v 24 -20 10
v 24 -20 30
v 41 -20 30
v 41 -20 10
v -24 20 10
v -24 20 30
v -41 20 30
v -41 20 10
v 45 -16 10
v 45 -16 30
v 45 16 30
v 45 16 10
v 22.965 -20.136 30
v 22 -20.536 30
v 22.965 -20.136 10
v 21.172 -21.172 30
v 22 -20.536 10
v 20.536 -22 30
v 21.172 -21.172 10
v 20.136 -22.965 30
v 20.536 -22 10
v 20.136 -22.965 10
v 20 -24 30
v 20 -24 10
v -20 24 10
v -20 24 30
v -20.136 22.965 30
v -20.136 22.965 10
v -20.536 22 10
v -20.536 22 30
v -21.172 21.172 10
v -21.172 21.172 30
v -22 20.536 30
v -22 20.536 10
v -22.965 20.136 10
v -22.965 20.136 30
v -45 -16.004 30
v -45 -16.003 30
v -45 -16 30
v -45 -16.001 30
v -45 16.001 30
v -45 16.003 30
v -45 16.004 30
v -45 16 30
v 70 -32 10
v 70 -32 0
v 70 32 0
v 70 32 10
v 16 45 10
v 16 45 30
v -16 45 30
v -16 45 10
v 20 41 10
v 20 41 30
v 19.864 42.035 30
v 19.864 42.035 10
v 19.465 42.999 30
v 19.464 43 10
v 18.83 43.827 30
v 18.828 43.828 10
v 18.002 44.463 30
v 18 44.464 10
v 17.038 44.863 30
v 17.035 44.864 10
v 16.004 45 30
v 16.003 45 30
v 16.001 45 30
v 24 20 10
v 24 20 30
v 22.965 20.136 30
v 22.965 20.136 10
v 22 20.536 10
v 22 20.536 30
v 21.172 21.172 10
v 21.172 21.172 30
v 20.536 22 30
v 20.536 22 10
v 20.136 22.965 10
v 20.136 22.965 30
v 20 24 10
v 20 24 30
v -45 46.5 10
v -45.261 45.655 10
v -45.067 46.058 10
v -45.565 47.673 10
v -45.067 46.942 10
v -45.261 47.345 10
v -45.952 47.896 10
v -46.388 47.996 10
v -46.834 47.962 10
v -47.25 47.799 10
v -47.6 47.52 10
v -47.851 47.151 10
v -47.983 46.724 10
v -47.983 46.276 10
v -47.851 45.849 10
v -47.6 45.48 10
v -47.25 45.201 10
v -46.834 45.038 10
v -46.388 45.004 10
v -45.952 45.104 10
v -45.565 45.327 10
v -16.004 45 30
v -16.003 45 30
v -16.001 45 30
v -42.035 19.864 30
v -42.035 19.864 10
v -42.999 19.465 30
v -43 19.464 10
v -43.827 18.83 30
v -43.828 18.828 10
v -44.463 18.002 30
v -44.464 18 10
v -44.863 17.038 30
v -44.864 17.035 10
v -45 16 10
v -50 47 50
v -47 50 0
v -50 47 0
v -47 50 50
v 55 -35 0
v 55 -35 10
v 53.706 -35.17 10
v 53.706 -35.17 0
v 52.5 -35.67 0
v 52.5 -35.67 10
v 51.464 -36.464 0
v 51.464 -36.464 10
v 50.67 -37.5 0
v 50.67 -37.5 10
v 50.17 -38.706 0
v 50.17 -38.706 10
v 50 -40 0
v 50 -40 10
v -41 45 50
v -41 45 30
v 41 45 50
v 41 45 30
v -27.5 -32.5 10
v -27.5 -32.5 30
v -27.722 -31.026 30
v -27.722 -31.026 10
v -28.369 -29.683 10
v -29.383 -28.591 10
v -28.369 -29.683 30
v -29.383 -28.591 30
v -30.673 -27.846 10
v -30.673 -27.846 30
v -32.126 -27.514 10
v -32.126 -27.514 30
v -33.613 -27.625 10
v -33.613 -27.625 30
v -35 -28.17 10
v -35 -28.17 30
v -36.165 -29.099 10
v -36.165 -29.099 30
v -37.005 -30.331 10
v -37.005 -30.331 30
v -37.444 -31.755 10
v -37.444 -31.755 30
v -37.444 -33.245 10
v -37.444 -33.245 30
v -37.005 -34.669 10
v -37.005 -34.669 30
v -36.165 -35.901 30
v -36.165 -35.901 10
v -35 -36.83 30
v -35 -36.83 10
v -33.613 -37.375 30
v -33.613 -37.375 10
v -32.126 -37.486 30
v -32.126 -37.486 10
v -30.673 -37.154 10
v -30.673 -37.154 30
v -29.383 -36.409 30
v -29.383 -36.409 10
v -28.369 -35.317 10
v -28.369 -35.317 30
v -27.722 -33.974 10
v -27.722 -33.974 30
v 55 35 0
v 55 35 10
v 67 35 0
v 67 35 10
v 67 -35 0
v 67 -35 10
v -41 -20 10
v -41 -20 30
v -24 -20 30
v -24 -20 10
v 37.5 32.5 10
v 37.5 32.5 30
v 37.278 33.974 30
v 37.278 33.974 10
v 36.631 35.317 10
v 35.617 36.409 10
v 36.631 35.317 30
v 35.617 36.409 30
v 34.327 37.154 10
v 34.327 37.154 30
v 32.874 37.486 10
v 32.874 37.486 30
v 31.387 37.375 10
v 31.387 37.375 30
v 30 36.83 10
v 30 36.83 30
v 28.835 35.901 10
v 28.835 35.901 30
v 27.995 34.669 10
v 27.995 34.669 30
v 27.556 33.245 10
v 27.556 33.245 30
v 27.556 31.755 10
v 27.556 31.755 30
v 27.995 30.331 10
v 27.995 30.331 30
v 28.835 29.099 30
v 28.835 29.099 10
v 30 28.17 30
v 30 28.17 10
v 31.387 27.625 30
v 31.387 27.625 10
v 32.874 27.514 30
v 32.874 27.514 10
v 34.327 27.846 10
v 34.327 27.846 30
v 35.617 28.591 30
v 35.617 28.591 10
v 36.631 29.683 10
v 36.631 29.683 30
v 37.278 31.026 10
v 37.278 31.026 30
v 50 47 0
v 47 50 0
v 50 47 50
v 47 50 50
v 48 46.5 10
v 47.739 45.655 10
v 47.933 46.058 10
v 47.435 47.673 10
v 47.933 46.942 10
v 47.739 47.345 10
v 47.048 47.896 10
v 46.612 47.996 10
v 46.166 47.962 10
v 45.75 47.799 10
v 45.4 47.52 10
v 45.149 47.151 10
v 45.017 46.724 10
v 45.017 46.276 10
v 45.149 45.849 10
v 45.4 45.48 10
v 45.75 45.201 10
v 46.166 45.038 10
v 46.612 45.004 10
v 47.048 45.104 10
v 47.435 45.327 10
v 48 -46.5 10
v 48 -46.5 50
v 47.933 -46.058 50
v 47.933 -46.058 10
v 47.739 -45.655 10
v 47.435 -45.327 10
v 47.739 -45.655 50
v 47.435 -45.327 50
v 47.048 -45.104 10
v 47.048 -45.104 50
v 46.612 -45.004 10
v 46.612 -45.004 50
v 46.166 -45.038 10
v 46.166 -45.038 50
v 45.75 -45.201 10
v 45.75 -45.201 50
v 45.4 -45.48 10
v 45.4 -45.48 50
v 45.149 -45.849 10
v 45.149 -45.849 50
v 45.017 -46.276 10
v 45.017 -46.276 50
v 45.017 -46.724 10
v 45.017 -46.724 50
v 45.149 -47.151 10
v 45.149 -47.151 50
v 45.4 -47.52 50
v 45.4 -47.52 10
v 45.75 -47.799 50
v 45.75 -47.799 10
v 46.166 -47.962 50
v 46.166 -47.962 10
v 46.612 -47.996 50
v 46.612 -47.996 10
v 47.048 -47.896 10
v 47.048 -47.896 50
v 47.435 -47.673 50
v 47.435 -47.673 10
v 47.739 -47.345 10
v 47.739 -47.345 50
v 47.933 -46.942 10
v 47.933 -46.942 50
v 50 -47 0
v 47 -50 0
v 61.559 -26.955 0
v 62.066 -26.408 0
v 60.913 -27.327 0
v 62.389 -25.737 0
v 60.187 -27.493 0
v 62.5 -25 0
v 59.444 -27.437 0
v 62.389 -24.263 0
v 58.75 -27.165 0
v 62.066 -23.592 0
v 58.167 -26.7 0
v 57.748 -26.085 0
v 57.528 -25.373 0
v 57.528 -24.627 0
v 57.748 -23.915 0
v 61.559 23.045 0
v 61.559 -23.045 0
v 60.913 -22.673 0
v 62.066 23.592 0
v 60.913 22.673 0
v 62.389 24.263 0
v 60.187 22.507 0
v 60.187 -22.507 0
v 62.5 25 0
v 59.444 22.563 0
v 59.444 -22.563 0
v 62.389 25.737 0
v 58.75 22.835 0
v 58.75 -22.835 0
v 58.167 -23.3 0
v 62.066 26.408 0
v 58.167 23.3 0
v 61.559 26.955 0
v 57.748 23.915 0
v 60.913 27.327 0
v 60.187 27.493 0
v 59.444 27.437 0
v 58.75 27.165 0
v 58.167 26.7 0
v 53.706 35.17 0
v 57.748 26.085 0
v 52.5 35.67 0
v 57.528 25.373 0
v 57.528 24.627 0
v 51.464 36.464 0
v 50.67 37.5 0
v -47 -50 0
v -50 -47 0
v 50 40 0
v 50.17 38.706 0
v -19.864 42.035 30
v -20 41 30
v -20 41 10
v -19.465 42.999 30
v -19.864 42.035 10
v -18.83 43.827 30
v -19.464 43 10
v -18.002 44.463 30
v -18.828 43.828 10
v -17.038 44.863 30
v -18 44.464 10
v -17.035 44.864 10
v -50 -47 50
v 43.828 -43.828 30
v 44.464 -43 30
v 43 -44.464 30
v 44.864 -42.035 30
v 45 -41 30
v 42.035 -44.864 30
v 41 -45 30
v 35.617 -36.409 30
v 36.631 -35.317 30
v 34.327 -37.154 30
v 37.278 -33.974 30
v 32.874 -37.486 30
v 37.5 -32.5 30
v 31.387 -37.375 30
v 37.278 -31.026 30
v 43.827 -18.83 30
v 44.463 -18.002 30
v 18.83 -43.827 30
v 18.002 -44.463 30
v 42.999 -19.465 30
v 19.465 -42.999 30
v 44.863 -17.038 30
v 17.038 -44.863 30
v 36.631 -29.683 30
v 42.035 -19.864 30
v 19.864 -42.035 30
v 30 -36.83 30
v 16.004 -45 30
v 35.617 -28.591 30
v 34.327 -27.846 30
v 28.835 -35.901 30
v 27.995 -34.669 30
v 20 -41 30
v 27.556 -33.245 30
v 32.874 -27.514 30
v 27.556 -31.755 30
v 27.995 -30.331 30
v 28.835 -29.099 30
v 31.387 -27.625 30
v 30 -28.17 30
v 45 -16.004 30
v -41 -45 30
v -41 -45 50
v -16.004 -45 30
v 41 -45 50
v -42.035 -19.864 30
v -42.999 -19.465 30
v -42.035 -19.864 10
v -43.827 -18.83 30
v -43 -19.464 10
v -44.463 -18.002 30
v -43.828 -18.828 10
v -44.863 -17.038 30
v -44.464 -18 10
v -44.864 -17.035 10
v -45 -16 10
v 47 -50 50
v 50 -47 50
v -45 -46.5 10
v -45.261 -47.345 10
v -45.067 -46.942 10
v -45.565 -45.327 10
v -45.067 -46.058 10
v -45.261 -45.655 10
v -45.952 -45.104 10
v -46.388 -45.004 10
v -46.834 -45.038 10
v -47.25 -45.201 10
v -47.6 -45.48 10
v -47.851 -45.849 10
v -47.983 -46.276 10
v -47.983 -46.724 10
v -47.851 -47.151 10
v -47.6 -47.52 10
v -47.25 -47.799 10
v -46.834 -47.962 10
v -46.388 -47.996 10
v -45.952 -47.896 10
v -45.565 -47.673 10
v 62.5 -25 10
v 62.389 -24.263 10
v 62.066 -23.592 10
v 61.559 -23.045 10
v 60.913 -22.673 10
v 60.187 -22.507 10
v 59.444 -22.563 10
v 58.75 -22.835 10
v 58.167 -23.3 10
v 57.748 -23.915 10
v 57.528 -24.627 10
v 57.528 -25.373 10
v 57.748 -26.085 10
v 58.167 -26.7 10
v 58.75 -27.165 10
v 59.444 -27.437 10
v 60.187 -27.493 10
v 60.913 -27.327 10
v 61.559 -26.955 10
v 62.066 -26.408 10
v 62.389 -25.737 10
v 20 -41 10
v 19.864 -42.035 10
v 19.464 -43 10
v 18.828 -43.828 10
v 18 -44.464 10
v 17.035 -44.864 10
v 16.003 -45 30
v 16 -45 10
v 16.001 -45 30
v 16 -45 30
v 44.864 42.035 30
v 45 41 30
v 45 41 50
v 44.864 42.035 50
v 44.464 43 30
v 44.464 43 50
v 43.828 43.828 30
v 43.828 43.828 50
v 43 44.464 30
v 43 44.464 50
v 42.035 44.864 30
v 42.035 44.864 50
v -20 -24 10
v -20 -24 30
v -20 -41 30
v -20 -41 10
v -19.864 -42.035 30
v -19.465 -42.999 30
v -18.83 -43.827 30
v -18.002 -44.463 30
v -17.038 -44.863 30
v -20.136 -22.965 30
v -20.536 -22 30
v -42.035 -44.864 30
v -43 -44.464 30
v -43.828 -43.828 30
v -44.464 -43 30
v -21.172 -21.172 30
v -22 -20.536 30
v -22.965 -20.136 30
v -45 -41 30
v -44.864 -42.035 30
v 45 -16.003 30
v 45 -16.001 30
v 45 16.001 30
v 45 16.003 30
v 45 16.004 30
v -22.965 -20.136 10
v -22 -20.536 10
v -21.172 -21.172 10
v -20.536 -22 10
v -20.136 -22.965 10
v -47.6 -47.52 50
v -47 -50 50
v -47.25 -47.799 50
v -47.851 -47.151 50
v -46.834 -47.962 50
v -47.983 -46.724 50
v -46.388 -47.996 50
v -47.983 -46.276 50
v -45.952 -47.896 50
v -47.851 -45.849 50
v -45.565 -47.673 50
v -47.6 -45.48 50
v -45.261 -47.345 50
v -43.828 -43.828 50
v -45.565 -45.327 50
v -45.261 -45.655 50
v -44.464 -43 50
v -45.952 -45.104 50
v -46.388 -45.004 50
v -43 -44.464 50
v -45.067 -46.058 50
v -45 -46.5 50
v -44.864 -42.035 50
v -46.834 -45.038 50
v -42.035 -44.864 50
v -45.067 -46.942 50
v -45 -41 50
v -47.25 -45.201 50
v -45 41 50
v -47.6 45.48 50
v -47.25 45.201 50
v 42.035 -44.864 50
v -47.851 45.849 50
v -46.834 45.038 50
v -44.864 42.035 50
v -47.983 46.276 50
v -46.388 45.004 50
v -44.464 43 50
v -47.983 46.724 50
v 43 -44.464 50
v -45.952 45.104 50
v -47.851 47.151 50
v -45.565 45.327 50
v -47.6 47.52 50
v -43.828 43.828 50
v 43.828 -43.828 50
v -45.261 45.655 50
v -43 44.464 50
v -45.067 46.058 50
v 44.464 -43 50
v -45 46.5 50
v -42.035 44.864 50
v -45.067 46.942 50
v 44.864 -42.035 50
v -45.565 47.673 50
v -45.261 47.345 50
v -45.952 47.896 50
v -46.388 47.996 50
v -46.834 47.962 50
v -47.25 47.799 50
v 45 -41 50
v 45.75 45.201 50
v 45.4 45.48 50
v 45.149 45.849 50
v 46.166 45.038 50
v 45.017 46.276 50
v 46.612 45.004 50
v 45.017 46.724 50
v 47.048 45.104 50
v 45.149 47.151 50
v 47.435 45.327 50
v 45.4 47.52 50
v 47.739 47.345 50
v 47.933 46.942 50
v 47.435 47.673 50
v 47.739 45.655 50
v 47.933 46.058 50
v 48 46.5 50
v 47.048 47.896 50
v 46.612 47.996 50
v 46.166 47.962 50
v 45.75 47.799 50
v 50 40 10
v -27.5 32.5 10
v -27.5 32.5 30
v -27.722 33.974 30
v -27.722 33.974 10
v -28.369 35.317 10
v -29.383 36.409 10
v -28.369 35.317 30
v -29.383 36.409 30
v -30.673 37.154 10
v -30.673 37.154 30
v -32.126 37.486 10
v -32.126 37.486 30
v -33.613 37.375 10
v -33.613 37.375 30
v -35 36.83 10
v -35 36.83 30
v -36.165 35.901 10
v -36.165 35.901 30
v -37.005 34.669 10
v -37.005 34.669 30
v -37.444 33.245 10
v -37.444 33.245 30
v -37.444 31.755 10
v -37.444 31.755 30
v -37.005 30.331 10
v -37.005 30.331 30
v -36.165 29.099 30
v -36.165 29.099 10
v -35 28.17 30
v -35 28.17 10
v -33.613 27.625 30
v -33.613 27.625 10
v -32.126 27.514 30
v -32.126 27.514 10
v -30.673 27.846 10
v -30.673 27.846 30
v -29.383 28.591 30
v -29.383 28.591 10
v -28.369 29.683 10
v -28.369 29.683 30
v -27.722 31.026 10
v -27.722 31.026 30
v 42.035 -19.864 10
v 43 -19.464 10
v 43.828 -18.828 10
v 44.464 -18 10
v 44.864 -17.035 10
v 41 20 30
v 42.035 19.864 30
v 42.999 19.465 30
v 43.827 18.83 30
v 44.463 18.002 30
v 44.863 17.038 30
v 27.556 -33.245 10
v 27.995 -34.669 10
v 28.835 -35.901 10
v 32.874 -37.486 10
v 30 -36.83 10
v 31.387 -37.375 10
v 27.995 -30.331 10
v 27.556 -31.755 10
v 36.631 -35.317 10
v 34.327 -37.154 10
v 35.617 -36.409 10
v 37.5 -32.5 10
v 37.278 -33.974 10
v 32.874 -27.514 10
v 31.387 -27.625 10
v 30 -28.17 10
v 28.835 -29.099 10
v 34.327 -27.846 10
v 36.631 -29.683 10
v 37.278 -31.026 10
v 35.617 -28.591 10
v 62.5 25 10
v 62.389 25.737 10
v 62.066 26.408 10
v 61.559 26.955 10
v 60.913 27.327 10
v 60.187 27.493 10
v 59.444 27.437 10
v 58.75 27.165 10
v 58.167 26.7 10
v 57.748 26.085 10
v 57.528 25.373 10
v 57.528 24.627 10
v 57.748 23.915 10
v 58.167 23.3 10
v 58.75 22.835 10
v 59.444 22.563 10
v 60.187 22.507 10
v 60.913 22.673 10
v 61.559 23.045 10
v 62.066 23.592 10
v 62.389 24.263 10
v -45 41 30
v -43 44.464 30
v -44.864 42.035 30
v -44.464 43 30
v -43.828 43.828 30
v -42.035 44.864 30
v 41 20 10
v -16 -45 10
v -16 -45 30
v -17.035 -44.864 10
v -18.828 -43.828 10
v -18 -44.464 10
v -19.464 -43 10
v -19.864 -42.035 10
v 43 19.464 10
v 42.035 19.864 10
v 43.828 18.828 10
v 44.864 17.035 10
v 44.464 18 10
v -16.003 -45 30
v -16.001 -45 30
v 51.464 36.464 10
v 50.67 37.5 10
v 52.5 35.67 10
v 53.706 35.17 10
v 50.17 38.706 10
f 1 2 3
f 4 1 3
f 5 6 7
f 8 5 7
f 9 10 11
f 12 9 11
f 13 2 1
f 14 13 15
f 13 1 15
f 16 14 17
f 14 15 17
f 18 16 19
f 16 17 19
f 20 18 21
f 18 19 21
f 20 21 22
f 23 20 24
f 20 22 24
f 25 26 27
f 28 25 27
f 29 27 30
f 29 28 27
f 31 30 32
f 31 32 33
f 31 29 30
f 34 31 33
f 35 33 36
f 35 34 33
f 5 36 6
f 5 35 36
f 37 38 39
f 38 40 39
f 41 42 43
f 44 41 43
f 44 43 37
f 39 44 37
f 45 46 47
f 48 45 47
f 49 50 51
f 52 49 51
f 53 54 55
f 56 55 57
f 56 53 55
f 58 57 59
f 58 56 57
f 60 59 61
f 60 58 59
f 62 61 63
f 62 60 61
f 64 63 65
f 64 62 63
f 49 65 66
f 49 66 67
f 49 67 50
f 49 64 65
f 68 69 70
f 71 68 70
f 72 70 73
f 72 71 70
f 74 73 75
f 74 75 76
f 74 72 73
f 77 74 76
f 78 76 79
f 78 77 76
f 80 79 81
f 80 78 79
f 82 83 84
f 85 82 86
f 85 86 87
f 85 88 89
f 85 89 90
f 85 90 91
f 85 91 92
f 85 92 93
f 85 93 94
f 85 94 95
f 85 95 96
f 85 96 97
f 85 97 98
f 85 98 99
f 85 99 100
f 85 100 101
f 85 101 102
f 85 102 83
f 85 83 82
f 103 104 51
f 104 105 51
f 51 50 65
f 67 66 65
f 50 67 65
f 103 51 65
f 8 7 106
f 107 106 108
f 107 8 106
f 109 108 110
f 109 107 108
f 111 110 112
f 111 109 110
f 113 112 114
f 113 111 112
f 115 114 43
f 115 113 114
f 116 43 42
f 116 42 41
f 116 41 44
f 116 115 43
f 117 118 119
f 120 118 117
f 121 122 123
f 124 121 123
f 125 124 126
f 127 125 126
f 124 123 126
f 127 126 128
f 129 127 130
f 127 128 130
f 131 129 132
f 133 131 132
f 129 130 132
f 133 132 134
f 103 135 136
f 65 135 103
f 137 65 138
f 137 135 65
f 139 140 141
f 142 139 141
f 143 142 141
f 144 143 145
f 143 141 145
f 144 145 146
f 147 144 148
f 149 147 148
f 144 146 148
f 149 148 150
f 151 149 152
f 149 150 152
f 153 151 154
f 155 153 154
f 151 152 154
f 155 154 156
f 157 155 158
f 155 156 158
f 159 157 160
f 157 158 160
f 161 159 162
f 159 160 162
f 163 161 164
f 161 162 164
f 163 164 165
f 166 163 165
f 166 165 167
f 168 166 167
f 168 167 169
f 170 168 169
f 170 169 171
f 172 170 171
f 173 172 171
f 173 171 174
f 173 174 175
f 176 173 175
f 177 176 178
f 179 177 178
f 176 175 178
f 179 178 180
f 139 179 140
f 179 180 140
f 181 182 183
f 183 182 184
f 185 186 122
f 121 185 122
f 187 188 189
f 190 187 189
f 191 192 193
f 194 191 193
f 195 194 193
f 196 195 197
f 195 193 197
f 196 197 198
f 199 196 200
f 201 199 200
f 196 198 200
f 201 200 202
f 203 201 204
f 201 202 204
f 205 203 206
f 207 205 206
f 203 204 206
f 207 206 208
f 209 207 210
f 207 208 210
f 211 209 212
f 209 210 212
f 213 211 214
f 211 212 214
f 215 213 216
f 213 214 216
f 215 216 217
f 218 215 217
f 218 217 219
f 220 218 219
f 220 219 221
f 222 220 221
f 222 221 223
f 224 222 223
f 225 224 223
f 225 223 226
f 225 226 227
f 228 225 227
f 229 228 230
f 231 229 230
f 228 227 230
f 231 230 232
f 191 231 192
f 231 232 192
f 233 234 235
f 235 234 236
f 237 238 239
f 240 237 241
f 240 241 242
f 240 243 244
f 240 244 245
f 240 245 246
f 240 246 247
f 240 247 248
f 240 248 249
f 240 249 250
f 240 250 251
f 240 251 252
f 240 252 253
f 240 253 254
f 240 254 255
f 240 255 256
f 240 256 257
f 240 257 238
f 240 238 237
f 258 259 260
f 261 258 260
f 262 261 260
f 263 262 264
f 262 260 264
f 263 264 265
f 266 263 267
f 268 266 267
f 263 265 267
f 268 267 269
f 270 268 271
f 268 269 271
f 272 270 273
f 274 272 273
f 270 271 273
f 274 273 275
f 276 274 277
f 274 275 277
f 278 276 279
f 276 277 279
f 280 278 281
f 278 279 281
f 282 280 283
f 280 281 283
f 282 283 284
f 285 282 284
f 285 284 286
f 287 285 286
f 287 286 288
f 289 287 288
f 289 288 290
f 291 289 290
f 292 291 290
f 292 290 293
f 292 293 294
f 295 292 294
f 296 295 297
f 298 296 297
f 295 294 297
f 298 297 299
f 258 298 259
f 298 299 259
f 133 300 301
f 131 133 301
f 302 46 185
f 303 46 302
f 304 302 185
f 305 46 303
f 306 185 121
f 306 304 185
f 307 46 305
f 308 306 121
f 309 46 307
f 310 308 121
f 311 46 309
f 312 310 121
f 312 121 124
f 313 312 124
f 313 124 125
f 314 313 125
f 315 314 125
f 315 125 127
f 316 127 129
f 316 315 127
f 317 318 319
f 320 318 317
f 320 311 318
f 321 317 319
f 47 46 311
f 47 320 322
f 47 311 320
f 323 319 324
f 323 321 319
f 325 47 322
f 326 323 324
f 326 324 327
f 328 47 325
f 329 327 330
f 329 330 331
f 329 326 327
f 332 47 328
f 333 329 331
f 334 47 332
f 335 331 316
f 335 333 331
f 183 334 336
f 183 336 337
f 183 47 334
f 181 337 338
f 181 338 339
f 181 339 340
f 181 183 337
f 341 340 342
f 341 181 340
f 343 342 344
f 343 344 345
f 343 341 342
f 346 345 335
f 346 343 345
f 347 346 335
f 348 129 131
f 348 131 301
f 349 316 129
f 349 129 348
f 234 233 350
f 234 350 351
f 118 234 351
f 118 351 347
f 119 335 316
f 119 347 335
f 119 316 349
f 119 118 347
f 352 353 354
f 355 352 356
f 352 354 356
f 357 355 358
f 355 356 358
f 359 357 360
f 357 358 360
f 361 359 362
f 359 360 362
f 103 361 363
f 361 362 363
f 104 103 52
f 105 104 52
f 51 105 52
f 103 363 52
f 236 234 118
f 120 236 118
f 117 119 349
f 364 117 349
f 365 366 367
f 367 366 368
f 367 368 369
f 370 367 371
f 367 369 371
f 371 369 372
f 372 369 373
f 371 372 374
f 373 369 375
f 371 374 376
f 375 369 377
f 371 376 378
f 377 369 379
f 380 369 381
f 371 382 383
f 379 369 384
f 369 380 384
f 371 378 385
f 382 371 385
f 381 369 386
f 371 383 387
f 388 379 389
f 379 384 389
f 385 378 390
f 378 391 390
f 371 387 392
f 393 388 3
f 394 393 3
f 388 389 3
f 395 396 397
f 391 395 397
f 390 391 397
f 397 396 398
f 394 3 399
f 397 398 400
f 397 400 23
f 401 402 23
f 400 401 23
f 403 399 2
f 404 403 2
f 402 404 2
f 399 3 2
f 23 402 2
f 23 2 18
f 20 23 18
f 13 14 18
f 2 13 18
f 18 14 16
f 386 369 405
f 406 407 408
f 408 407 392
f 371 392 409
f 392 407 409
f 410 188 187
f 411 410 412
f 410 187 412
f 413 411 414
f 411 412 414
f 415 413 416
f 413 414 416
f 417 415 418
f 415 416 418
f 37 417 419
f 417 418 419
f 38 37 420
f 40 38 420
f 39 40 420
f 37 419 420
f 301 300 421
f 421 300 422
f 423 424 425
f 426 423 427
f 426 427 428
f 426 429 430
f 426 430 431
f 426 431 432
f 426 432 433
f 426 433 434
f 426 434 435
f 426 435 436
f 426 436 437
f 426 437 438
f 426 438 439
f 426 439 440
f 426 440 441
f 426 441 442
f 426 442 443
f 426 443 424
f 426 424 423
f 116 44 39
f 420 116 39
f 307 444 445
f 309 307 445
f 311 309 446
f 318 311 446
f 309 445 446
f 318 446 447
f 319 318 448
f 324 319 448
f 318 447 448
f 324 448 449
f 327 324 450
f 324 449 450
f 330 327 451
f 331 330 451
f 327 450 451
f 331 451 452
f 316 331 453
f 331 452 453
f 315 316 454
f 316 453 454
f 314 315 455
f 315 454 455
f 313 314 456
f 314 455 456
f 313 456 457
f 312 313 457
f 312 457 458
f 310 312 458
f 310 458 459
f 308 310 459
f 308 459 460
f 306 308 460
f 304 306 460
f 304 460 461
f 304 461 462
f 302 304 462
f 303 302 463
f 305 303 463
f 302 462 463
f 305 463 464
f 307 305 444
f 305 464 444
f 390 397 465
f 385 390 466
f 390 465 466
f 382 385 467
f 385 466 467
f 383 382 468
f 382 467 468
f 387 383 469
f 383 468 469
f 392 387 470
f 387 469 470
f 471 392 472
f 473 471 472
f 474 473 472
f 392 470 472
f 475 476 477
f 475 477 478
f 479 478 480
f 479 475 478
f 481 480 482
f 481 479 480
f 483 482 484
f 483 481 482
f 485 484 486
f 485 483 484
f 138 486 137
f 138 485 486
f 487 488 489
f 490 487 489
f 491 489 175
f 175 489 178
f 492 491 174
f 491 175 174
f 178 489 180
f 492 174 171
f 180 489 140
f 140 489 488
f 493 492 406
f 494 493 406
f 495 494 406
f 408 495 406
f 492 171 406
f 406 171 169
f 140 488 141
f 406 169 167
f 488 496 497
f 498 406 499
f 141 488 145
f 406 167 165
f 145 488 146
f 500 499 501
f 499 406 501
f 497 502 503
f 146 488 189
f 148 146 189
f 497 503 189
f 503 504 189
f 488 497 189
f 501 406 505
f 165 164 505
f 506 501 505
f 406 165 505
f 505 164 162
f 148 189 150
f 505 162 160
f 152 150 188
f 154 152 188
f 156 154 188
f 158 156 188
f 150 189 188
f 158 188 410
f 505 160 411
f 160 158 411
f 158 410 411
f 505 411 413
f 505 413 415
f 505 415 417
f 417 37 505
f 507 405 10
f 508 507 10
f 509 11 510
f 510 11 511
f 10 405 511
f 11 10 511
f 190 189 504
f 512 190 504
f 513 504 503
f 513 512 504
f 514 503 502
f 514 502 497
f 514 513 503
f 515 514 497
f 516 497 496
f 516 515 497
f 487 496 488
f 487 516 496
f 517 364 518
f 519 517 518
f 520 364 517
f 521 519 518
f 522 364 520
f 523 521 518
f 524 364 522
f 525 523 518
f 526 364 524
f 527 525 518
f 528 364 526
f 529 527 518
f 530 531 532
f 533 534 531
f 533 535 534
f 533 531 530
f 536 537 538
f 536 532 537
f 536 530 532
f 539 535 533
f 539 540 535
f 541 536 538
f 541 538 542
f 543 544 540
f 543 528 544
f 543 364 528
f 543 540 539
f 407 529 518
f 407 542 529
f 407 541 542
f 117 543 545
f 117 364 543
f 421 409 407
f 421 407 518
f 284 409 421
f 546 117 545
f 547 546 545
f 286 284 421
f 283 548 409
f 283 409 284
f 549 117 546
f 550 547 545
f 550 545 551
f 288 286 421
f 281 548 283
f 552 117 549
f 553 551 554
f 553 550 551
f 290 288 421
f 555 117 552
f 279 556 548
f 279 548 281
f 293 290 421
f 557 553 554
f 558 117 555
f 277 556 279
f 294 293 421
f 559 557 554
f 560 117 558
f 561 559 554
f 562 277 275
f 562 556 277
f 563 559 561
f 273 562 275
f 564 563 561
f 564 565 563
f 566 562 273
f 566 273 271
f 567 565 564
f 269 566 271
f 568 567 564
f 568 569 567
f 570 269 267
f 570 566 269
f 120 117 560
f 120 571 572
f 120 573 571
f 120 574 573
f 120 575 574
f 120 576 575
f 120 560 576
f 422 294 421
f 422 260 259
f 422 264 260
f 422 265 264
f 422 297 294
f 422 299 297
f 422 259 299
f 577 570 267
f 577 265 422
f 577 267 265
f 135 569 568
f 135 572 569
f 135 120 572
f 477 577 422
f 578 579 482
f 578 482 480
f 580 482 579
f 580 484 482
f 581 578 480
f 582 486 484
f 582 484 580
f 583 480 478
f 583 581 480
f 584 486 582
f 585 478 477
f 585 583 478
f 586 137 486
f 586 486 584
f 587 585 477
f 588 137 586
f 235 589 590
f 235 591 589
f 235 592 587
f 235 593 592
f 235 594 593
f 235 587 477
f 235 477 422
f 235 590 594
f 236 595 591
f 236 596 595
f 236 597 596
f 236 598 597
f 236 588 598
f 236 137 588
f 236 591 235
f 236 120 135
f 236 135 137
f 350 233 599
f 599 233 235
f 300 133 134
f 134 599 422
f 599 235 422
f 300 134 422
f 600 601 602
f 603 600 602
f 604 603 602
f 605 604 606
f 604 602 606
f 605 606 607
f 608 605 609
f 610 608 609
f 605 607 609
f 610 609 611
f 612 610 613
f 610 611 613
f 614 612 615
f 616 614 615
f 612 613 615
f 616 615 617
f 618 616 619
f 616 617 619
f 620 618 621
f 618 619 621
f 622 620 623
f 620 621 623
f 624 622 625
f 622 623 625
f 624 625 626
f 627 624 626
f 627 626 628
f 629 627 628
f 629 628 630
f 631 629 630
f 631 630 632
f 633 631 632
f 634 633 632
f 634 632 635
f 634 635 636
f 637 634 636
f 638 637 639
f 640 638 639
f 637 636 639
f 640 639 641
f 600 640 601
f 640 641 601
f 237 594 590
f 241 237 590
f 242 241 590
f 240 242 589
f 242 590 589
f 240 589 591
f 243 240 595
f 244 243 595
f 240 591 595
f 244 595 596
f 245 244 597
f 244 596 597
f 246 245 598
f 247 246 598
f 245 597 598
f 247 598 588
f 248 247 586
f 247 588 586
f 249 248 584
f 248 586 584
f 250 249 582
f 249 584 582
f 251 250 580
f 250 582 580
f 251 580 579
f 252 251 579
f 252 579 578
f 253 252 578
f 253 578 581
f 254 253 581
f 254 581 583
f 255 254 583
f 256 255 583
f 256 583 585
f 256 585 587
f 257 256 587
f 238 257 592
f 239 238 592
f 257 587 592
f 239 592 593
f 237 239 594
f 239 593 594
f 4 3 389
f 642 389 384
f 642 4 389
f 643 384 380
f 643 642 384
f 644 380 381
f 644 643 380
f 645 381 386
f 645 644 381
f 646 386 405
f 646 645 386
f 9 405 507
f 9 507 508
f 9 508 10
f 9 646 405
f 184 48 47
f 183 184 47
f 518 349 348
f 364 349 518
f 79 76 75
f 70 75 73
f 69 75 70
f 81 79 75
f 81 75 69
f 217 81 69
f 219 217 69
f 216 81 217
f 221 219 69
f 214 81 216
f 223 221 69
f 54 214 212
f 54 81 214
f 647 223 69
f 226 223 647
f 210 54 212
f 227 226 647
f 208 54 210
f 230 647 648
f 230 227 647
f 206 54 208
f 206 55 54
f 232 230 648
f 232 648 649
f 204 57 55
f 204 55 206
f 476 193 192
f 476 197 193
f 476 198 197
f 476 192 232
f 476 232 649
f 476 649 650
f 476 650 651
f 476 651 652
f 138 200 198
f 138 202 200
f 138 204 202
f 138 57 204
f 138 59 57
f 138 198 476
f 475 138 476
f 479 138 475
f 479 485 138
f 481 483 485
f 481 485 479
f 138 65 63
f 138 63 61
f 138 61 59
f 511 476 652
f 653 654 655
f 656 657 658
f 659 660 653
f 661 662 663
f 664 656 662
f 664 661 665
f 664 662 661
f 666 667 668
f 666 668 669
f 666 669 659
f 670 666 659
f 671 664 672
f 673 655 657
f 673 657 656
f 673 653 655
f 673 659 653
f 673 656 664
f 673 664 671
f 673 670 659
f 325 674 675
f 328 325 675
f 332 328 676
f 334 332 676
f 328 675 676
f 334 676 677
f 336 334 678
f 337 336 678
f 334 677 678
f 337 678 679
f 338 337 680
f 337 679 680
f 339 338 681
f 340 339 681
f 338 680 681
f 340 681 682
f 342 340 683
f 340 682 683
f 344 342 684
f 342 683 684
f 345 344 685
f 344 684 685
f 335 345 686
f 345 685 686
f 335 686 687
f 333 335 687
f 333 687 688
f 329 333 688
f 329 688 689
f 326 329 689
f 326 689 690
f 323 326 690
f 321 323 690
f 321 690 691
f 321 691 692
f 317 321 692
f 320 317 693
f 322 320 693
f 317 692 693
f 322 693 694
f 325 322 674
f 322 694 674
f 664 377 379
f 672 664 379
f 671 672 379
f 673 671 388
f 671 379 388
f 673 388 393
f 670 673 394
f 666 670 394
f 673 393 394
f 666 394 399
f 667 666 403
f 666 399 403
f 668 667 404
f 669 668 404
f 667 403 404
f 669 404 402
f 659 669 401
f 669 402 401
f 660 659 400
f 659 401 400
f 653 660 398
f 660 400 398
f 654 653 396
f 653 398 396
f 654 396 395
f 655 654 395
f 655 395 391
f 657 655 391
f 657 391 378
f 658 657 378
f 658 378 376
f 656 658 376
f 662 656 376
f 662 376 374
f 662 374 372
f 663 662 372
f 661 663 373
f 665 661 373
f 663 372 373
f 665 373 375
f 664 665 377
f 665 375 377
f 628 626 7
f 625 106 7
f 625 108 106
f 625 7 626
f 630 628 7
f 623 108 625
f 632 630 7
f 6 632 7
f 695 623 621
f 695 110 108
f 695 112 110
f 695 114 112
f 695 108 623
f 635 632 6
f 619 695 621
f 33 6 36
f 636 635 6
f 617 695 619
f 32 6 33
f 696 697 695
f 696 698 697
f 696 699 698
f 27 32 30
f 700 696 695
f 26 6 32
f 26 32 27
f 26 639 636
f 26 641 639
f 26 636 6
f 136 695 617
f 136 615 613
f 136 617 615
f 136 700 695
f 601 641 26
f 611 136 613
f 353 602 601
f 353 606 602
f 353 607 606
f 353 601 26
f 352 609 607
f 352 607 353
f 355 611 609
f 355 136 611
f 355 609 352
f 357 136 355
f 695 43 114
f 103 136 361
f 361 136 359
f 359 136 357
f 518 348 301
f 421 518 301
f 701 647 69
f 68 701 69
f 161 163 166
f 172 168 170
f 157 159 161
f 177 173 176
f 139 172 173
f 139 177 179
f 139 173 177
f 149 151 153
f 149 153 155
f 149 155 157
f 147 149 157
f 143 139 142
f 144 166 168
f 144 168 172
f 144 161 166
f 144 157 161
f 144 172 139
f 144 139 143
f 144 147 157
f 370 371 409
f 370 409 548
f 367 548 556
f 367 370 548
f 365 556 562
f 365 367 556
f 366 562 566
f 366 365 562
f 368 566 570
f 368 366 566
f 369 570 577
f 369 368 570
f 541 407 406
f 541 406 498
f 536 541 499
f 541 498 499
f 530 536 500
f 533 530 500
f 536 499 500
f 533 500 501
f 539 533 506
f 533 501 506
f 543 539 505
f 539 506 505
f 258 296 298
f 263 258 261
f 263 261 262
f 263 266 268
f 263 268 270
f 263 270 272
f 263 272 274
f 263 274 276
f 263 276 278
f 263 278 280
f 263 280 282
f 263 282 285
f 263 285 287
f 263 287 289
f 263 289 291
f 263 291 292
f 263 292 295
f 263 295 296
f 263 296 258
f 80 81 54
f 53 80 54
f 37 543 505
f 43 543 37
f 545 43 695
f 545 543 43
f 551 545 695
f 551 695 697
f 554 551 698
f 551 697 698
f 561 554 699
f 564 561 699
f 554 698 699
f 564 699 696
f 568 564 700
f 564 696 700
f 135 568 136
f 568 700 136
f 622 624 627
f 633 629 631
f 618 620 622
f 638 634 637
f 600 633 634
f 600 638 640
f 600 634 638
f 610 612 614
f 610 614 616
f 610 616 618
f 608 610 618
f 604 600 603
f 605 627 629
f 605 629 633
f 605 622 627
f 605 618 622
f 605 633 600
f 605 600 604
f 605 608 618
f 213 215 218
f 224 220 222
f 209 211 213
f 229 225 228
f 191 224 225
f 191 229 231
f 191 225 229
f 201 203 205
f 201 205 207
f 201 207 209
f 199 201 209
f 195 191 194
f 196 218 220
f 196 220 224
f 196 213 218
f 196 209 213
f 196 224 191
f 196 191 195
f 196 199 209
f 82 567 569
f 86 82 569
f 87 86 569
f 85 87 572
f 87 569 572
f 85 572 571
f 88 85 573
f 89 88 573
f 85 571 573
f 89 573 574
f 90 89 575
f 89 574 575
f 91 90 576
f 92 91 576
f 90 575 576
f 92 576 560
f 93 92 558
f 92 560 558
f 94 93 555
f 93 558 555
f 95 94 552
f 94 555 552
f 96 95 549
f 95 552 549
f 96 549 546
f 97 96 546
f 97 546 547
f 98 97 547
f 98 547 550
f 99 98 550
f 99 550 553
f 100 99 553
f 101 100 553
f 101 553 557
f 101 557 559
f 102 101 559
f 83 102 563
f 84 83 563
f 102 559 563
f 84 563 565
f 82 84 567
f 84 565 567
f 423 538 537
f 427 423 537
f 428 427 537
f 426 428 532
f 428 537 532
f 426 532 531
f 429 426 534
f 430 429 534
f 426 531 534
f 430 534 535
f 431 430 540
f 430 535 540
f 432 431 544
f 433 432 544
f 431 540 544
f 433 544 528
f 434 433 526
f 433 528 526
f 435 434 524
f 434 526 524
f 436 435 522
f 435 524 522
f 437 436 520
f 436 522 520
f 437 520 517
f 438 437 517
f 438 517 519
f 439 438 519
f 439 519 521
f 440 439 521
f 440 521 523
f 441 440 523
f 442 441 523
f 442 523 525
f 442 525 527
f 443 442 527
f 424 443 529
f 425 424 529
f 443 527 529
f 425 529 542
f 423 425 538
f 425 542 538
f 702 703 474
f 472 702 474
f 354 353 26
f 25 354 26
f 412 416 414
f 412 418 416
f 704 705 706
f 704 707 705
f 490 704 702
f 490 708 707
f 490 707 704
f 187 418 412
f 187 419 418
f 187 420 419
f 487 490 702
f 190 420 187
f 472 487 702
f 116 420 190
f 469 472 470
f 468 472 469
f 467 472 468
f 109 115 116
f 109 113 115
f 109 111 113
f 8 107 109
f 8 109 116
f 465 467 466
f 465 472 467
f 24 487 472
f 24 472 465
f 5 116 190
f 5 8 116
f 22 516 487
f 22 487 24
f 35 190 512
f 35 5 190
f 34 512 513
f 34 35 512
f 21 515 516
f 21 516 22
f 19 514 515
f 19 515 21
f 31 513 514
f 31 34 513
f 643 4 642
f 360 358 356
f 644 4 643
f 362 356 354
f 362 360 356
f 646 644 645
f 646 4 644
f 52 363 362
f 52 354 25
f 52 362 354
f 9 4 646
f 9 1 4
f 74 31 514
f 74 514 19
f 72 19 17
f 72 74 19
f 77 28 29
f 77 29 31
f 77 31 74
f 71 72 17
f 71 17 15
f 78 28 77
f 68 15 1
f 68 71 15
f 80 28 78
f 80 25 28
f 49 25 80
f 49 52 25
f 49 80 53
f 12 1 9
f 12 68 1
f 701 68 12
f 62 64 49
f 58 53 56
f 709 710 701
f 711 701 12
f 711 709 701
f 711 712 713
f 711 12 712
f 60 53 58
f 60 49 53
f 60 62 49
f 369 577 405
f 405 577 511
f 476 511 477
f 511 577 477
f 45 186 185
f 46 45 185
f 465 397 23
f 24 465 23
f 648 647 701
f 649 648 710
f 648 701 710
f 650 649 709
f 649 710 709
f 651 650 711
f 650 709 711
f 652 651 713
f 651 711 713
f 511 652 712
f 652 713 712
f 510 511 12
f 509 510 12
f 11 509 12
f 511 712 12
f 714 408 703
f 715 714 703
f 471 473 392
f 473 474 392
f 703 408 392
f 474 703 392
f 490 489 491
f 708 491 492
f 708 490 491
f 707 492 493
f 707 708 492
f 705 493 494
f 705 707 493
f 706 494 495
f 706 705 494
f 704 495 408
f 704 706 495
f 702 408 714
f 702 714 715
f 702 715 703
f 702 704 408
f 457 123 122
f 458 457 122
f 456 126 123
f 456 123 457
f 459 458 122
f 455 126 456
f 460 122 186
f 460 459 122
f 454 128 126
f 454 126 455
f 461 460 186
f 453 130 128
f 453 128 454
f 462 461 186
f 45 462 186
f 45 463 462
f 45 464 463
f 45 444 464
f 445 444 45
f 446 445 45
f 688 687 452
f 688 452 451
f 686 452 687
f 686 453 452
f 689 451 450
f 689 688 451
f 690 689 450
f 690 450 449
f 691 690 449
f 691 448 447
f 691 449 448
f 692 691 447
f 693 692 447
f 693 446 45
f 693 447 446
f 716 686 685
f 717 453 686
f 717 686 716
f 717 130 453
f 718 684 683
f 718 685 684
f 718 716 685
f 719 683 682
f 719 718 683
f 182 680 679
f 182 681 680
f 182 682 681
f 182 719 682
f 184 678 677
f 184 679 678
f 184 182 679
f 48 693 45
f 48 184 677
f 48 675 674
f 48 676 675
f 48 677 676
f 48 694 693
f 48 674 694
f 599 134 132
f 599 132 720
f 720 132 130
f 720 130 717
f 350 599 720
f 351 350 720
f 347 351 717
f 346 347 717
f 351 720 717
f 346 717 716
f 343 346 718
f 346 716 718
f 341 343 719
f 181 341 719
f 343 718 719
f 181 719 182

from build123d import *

# Parameters (mm, degrees)
F1_DEPTH     = 50
F2_W         = 20
F2_H         = 100
F3_DEPTH     = 40
F4_R         = 2.5
F5_DEPTH     = 10
F6_W         = 90
F6_H         = 90
F7_DEPTH     = 20
F8_R         = 5
F9_DEPTH     = 20
F10_R        = 1.5
F11_DEPTH    = 40
F12_SIZE     = 3
F13_T1_DEPTH = 30
F13_T3_DEPTH = 30
F13_T5_DEPTH = 30


# Not quite as in the source:
# - a fillet or chamfer that OpenCascade refuses, or shapes differently, is made with other operations: its cross-section is extruded or revolved along the edge and cut away or added


with BuildPart() as f1:
    # F0 (on Top) → F1 (new body)
    with BuildSketch(Plane.XY):
        Polygon((-50, -50), (50, -50), (70, -50), (70, 50), (50, 50), (-50, 50), align=None)
    extrude(amount=F1_DEPTH)

    # F2 (on face) → F3 (cut)
    with BuildSketch(Plane.XY.offset(50)):
        with Locations((60, 0)):
            Rectangle(F2_W, F2_H)
    extrude(amount=-F3_DEPTH, mode=Mode.SUBTRACT)

    # F4 (on face) → F5 (cut, through all)
    with BuildSketch(Plane.XY.offset(10)):
        with BuildLine():
            Line((50, -40), (50, -50))
            Line((50, -50), (70, -50))
            Line((70, -50), (70, -35))
            Line((70, -35), (55, -35))
            ThreePointArc((55, -35), (51.4644660941, -36.4644660941), (50, -40))
        make_face()
        with Locations((60, -25)):
            Circle(F4_R)
        with Locations((60, 25)):
            Circle(F4_R)
        with BuildLine():
            ThreePointArc((50, 40), (51.4644660941, 36.4644660941), (55, 35))
            Line((55, 35), (70, 35))
            Line((70, 35), (70, 50))
            Line((70, 50), (50, 50))
            Line((50, 50), (50, 40))
        make_face()
    extrude(amount=-F5_DEPTH, mode=Mode.SUBTRACT)

    # F6 (on face) → F7 (cut)
    with BuildSketch(Plane.XY.offset(50)):
        Rectangle(F6_W, F6_H)
    extrude(amount=-F7_DEPTH, mode=Mode.SUBTRACT)

    # F8 (on face) → F9 (cut)
    with BuildSketch(Plane.XY.offset(30)):
        with Locations((-32.5000025332, 32.5000174344)):
            Circle(F8_R)
        Polygon((-45.0000017881, 20.0000017881), (-45.0000017881, -20.0000017881), (-20.0000017881, -20.0000017881), (-20.0000017881, -45.0000017881), (20.0000017881, -45.0000017881), (20.0000017881, -20.0000017881), (45.0000017881, -20.0000017881), (45.0000017881, 20.0000017881), (20.0000017881, 20.0000017881), (20.0000017881, 45.0000017881), (-20.0000017881, 45.0000017881), (-20.0000017881, 20.0000017881), align=None)
        with Locations((-32.5000025332, -32.5000174344)):
            Circle(F8_R)
        with Locations((32.5000025332, 32.5000174344)):
            Circle(F8_R)
        with Locations((32.5000025332, -32.5000174344)):
            Circle(F8_R)
    extrude(amount=-F9_DEPTH, mode=Mode.SUBTRACT)

    # F10 (on face) → F11 (cut)
    with BuildSketch(Plane.XY.offset(50)):
        with Locations((-46.5, 46.5)):
            Circle(F10_R)
        with Locations((-46.5, -46.5)):
            Circle(F10_R)
        with Locations((46.5, 46.5)):
            Circle(F10_R)
        with Locations((46.5, -46.5)):
            Circle(F10_R)
    extrude(amount=-F11_DEPTH, mode=Mode.SUBTRACT)

    # F12
    f12_edges = [f1.edges().sort_by_distance(p)[0] for p in [
        (70, -35, 5),
        (70, 35, 5),
        (50, -50, 25),
        (-50, -50, 25),
        (50, 50, 25),
        (-50, 50, 25),
    ]]
    chamfer(f12_edges, length=F12_SIZE)

    # F13: fillet of radius 4 on 16 edges, made by hand

    # F13_s2 → F13_t1 (join)
    with BuildSketch(Plane.XY.offset(20)):
        with BuildLine():
            ThreePointArc((-45, 41), (-43.8284271247, 43.8284271247), (-41, 45))
            Line((-41, 45), (-45, 45))
            Line((-45, 45), (-45, 41))
        make_face()
        with BuildLine():
            ThreePointArc((45, 41), (43.8284271247, 43.8284271247), (41, 45))
            Line((41, 45), (45, 45))
            Line((45, 45), (45, 41))
        make_face()
        with BuildLine():
            ThreePointArc((41, -45), (43.8284271247, -43.8284271247), (45, -41))
            Line((45, -41), (45, -45))
            Line((45, -45), (41, -45))
        make_face()
        with BuildLine():
            ThreePointArc((-41, -45), (-43.8284271247, -43.8284271247), (-45, -41))
            Line((-45, -41), (-45, -45))
            Line((-45, -45), (-41, -45))
        make_face()
    extrude(amount=F13_T1_DEPTH)

    # F13_s4 → F13_t3 (join)
    with BuildSketch(Plane.XY):
        with BuildLine():
            ThreePointArc((-41.0000017881, 20.0000017881), (-43.8284289129, 18.8284289129), (-45.0000017881, 16.0000017881))
            Line((-45.0000017881, 16.0000017881), (-45.0000017881, 20.0000017881))
            Line((-45.0000017881, 20.0000017881), (-41.0000017881, 20.0000017881))
        make_face()
        with BuildLine():
            ThreePointArc((-20.0000017881, 41.0000017881), (-18.8284289129, 43.8284289129), (-16.0000017881, 45.0000017881))
            Line((-16.0000017881, 45.0000017881), (-20.0000017881, 45.0000017881))
            Line((-20.0000017881, 45.0000017881), (-20.0000017881, 41.0000017881))
        make_face()
        with BuildLine():
            ThreePointArc((20.0000017881, 41.0000017881), (18.8284289129, 43.8284289129), (16.0000017881, 45.0000017881))
            Line((16.0000017881, 45.0000017881), (20.0000017881, 45.0000017881))
            Line((20.0000017881, 45.0000017881), (20.0000017881, 41.0000017881))
        make_face()
        with BuildLine():
            ThreePointArc((41.0000017881, 20.0000017881), (43.8284289129, 18.8284289129), (45.0000017881, 16.0000017881))
            Line((45.0000017881, 16.0000017881), (45.0000017881, 20.0000017881))
            Line((45.0000017881, 20.0000017881), (41.0000017881, 20.0000017881))
        make_face()
        with BuildLine():
            ThreePointArc((-41.0000017881, -20.0000017881), (-43.8284289129, -18.8284289129), (-45.0000017881, -16.0000017881))
            Line((-45.0000017881, -16.0000017881), (-45.0000017881, -20.0000017881))
            Line((-45.0000017881, -20.0000017881), (-41.0000017881, -20.0000017881))
        make_face()
        with BuildLine():
            ThreePointArc((-20.0000017881, -41.0000017881), (-18.8284289129, -43.8284289129), (-16.0000017881, -45.0000017881))
            Line((-16.0000017881, -45.0000017881), (-20.0000017881, -45.0000017881))
            Line((-20.0000017881, -45.0000017881), (-20.0000017881, -41.0000017881))
        make_face()
        with BuildLine():
            ThreePointArc((20.0000017881, -41.0000017881), (18.8284289129, -43.8284289129), (16.0000017881, -45.0000017881))
            Line((16.0000017881, -45.0000017881), (20.0000017881, -45.0000017881))
            Line((20.0000017881, -45.0000017881), (20.0000017881, -41.0000017881))
        make_face()
        with BuildLine():
            ThreePointArc((41.0000017881, -20.0000017881), (43.8284289129, -18.8284289129), (45.0000017881, -16.0000017881))
            Line((45.0000017881, -16.0000017881), (45.0000017881, -20.0000017881))
            Line((45.0000017881, -20.0000017881), (41.0000017881, -20.0000017881))
        make_face()
    extrude(amount=F13_T3_DEPTH)

    # F13_s6 → F13_t5 (cut)
    with BuildSketch(Plane.XY.offset(10)):
        with BuildLine():
            ThreePointArc((-20.0000017881, 24.0000017881), (-21.1715746634, 21.1715746634), (-24.0000017881, 20.0000017881))
            Line((-24.0000017881, 20.0000017881), (-20.0000017881, 20.0000017881))
            Line((-20.0000017881, 20.0000017881), (-20.0000017881, 24.0000017881))
        make_face()
        with BuildLine():
            ThreePointArc((24.0000017881, 20.0000017881), (21.1715746634, 21.1715746634), (20.0000017881, 24.0000017881))
            Line((20.0000017881, 24.0000017881), (20.0000017881, 20.0000017881))
            Line((20.0000017881, 20.0000017881), (24.0000017881, 20.0000017881))
        make_face()
        with BuildLine():
            ThreePointArc((-24.0000017881, -20.0000017881), (-21.1715746634, -21.1715746634), (-20.0000017881, -24.0000017881))
            Line((-20.0000017881, -24.0000017881), (-20.0000017881, -20.0000017881))
            Line((-20.0000017881, -20.0000017881), (-24.0000017881, -20.0000017881))
        make_face()
        with BuildLine():
            ThreePointArc((24.0000017881, -20.0000017881), (21.1715746634, -21.1715746634), (20.0000017881, -24.0000017881))
            Line((20.0000017881, -24.0000017881), (20.0000017881, -20.0000017881))
            Line((20.0000017881, -20.0000017881), (24.0000017881, -20.0000017881))
        make_face()
    extrude(amount=F13_T5_DEPTH, mode=Mode.SUBTRACT)


solid = f1.part
